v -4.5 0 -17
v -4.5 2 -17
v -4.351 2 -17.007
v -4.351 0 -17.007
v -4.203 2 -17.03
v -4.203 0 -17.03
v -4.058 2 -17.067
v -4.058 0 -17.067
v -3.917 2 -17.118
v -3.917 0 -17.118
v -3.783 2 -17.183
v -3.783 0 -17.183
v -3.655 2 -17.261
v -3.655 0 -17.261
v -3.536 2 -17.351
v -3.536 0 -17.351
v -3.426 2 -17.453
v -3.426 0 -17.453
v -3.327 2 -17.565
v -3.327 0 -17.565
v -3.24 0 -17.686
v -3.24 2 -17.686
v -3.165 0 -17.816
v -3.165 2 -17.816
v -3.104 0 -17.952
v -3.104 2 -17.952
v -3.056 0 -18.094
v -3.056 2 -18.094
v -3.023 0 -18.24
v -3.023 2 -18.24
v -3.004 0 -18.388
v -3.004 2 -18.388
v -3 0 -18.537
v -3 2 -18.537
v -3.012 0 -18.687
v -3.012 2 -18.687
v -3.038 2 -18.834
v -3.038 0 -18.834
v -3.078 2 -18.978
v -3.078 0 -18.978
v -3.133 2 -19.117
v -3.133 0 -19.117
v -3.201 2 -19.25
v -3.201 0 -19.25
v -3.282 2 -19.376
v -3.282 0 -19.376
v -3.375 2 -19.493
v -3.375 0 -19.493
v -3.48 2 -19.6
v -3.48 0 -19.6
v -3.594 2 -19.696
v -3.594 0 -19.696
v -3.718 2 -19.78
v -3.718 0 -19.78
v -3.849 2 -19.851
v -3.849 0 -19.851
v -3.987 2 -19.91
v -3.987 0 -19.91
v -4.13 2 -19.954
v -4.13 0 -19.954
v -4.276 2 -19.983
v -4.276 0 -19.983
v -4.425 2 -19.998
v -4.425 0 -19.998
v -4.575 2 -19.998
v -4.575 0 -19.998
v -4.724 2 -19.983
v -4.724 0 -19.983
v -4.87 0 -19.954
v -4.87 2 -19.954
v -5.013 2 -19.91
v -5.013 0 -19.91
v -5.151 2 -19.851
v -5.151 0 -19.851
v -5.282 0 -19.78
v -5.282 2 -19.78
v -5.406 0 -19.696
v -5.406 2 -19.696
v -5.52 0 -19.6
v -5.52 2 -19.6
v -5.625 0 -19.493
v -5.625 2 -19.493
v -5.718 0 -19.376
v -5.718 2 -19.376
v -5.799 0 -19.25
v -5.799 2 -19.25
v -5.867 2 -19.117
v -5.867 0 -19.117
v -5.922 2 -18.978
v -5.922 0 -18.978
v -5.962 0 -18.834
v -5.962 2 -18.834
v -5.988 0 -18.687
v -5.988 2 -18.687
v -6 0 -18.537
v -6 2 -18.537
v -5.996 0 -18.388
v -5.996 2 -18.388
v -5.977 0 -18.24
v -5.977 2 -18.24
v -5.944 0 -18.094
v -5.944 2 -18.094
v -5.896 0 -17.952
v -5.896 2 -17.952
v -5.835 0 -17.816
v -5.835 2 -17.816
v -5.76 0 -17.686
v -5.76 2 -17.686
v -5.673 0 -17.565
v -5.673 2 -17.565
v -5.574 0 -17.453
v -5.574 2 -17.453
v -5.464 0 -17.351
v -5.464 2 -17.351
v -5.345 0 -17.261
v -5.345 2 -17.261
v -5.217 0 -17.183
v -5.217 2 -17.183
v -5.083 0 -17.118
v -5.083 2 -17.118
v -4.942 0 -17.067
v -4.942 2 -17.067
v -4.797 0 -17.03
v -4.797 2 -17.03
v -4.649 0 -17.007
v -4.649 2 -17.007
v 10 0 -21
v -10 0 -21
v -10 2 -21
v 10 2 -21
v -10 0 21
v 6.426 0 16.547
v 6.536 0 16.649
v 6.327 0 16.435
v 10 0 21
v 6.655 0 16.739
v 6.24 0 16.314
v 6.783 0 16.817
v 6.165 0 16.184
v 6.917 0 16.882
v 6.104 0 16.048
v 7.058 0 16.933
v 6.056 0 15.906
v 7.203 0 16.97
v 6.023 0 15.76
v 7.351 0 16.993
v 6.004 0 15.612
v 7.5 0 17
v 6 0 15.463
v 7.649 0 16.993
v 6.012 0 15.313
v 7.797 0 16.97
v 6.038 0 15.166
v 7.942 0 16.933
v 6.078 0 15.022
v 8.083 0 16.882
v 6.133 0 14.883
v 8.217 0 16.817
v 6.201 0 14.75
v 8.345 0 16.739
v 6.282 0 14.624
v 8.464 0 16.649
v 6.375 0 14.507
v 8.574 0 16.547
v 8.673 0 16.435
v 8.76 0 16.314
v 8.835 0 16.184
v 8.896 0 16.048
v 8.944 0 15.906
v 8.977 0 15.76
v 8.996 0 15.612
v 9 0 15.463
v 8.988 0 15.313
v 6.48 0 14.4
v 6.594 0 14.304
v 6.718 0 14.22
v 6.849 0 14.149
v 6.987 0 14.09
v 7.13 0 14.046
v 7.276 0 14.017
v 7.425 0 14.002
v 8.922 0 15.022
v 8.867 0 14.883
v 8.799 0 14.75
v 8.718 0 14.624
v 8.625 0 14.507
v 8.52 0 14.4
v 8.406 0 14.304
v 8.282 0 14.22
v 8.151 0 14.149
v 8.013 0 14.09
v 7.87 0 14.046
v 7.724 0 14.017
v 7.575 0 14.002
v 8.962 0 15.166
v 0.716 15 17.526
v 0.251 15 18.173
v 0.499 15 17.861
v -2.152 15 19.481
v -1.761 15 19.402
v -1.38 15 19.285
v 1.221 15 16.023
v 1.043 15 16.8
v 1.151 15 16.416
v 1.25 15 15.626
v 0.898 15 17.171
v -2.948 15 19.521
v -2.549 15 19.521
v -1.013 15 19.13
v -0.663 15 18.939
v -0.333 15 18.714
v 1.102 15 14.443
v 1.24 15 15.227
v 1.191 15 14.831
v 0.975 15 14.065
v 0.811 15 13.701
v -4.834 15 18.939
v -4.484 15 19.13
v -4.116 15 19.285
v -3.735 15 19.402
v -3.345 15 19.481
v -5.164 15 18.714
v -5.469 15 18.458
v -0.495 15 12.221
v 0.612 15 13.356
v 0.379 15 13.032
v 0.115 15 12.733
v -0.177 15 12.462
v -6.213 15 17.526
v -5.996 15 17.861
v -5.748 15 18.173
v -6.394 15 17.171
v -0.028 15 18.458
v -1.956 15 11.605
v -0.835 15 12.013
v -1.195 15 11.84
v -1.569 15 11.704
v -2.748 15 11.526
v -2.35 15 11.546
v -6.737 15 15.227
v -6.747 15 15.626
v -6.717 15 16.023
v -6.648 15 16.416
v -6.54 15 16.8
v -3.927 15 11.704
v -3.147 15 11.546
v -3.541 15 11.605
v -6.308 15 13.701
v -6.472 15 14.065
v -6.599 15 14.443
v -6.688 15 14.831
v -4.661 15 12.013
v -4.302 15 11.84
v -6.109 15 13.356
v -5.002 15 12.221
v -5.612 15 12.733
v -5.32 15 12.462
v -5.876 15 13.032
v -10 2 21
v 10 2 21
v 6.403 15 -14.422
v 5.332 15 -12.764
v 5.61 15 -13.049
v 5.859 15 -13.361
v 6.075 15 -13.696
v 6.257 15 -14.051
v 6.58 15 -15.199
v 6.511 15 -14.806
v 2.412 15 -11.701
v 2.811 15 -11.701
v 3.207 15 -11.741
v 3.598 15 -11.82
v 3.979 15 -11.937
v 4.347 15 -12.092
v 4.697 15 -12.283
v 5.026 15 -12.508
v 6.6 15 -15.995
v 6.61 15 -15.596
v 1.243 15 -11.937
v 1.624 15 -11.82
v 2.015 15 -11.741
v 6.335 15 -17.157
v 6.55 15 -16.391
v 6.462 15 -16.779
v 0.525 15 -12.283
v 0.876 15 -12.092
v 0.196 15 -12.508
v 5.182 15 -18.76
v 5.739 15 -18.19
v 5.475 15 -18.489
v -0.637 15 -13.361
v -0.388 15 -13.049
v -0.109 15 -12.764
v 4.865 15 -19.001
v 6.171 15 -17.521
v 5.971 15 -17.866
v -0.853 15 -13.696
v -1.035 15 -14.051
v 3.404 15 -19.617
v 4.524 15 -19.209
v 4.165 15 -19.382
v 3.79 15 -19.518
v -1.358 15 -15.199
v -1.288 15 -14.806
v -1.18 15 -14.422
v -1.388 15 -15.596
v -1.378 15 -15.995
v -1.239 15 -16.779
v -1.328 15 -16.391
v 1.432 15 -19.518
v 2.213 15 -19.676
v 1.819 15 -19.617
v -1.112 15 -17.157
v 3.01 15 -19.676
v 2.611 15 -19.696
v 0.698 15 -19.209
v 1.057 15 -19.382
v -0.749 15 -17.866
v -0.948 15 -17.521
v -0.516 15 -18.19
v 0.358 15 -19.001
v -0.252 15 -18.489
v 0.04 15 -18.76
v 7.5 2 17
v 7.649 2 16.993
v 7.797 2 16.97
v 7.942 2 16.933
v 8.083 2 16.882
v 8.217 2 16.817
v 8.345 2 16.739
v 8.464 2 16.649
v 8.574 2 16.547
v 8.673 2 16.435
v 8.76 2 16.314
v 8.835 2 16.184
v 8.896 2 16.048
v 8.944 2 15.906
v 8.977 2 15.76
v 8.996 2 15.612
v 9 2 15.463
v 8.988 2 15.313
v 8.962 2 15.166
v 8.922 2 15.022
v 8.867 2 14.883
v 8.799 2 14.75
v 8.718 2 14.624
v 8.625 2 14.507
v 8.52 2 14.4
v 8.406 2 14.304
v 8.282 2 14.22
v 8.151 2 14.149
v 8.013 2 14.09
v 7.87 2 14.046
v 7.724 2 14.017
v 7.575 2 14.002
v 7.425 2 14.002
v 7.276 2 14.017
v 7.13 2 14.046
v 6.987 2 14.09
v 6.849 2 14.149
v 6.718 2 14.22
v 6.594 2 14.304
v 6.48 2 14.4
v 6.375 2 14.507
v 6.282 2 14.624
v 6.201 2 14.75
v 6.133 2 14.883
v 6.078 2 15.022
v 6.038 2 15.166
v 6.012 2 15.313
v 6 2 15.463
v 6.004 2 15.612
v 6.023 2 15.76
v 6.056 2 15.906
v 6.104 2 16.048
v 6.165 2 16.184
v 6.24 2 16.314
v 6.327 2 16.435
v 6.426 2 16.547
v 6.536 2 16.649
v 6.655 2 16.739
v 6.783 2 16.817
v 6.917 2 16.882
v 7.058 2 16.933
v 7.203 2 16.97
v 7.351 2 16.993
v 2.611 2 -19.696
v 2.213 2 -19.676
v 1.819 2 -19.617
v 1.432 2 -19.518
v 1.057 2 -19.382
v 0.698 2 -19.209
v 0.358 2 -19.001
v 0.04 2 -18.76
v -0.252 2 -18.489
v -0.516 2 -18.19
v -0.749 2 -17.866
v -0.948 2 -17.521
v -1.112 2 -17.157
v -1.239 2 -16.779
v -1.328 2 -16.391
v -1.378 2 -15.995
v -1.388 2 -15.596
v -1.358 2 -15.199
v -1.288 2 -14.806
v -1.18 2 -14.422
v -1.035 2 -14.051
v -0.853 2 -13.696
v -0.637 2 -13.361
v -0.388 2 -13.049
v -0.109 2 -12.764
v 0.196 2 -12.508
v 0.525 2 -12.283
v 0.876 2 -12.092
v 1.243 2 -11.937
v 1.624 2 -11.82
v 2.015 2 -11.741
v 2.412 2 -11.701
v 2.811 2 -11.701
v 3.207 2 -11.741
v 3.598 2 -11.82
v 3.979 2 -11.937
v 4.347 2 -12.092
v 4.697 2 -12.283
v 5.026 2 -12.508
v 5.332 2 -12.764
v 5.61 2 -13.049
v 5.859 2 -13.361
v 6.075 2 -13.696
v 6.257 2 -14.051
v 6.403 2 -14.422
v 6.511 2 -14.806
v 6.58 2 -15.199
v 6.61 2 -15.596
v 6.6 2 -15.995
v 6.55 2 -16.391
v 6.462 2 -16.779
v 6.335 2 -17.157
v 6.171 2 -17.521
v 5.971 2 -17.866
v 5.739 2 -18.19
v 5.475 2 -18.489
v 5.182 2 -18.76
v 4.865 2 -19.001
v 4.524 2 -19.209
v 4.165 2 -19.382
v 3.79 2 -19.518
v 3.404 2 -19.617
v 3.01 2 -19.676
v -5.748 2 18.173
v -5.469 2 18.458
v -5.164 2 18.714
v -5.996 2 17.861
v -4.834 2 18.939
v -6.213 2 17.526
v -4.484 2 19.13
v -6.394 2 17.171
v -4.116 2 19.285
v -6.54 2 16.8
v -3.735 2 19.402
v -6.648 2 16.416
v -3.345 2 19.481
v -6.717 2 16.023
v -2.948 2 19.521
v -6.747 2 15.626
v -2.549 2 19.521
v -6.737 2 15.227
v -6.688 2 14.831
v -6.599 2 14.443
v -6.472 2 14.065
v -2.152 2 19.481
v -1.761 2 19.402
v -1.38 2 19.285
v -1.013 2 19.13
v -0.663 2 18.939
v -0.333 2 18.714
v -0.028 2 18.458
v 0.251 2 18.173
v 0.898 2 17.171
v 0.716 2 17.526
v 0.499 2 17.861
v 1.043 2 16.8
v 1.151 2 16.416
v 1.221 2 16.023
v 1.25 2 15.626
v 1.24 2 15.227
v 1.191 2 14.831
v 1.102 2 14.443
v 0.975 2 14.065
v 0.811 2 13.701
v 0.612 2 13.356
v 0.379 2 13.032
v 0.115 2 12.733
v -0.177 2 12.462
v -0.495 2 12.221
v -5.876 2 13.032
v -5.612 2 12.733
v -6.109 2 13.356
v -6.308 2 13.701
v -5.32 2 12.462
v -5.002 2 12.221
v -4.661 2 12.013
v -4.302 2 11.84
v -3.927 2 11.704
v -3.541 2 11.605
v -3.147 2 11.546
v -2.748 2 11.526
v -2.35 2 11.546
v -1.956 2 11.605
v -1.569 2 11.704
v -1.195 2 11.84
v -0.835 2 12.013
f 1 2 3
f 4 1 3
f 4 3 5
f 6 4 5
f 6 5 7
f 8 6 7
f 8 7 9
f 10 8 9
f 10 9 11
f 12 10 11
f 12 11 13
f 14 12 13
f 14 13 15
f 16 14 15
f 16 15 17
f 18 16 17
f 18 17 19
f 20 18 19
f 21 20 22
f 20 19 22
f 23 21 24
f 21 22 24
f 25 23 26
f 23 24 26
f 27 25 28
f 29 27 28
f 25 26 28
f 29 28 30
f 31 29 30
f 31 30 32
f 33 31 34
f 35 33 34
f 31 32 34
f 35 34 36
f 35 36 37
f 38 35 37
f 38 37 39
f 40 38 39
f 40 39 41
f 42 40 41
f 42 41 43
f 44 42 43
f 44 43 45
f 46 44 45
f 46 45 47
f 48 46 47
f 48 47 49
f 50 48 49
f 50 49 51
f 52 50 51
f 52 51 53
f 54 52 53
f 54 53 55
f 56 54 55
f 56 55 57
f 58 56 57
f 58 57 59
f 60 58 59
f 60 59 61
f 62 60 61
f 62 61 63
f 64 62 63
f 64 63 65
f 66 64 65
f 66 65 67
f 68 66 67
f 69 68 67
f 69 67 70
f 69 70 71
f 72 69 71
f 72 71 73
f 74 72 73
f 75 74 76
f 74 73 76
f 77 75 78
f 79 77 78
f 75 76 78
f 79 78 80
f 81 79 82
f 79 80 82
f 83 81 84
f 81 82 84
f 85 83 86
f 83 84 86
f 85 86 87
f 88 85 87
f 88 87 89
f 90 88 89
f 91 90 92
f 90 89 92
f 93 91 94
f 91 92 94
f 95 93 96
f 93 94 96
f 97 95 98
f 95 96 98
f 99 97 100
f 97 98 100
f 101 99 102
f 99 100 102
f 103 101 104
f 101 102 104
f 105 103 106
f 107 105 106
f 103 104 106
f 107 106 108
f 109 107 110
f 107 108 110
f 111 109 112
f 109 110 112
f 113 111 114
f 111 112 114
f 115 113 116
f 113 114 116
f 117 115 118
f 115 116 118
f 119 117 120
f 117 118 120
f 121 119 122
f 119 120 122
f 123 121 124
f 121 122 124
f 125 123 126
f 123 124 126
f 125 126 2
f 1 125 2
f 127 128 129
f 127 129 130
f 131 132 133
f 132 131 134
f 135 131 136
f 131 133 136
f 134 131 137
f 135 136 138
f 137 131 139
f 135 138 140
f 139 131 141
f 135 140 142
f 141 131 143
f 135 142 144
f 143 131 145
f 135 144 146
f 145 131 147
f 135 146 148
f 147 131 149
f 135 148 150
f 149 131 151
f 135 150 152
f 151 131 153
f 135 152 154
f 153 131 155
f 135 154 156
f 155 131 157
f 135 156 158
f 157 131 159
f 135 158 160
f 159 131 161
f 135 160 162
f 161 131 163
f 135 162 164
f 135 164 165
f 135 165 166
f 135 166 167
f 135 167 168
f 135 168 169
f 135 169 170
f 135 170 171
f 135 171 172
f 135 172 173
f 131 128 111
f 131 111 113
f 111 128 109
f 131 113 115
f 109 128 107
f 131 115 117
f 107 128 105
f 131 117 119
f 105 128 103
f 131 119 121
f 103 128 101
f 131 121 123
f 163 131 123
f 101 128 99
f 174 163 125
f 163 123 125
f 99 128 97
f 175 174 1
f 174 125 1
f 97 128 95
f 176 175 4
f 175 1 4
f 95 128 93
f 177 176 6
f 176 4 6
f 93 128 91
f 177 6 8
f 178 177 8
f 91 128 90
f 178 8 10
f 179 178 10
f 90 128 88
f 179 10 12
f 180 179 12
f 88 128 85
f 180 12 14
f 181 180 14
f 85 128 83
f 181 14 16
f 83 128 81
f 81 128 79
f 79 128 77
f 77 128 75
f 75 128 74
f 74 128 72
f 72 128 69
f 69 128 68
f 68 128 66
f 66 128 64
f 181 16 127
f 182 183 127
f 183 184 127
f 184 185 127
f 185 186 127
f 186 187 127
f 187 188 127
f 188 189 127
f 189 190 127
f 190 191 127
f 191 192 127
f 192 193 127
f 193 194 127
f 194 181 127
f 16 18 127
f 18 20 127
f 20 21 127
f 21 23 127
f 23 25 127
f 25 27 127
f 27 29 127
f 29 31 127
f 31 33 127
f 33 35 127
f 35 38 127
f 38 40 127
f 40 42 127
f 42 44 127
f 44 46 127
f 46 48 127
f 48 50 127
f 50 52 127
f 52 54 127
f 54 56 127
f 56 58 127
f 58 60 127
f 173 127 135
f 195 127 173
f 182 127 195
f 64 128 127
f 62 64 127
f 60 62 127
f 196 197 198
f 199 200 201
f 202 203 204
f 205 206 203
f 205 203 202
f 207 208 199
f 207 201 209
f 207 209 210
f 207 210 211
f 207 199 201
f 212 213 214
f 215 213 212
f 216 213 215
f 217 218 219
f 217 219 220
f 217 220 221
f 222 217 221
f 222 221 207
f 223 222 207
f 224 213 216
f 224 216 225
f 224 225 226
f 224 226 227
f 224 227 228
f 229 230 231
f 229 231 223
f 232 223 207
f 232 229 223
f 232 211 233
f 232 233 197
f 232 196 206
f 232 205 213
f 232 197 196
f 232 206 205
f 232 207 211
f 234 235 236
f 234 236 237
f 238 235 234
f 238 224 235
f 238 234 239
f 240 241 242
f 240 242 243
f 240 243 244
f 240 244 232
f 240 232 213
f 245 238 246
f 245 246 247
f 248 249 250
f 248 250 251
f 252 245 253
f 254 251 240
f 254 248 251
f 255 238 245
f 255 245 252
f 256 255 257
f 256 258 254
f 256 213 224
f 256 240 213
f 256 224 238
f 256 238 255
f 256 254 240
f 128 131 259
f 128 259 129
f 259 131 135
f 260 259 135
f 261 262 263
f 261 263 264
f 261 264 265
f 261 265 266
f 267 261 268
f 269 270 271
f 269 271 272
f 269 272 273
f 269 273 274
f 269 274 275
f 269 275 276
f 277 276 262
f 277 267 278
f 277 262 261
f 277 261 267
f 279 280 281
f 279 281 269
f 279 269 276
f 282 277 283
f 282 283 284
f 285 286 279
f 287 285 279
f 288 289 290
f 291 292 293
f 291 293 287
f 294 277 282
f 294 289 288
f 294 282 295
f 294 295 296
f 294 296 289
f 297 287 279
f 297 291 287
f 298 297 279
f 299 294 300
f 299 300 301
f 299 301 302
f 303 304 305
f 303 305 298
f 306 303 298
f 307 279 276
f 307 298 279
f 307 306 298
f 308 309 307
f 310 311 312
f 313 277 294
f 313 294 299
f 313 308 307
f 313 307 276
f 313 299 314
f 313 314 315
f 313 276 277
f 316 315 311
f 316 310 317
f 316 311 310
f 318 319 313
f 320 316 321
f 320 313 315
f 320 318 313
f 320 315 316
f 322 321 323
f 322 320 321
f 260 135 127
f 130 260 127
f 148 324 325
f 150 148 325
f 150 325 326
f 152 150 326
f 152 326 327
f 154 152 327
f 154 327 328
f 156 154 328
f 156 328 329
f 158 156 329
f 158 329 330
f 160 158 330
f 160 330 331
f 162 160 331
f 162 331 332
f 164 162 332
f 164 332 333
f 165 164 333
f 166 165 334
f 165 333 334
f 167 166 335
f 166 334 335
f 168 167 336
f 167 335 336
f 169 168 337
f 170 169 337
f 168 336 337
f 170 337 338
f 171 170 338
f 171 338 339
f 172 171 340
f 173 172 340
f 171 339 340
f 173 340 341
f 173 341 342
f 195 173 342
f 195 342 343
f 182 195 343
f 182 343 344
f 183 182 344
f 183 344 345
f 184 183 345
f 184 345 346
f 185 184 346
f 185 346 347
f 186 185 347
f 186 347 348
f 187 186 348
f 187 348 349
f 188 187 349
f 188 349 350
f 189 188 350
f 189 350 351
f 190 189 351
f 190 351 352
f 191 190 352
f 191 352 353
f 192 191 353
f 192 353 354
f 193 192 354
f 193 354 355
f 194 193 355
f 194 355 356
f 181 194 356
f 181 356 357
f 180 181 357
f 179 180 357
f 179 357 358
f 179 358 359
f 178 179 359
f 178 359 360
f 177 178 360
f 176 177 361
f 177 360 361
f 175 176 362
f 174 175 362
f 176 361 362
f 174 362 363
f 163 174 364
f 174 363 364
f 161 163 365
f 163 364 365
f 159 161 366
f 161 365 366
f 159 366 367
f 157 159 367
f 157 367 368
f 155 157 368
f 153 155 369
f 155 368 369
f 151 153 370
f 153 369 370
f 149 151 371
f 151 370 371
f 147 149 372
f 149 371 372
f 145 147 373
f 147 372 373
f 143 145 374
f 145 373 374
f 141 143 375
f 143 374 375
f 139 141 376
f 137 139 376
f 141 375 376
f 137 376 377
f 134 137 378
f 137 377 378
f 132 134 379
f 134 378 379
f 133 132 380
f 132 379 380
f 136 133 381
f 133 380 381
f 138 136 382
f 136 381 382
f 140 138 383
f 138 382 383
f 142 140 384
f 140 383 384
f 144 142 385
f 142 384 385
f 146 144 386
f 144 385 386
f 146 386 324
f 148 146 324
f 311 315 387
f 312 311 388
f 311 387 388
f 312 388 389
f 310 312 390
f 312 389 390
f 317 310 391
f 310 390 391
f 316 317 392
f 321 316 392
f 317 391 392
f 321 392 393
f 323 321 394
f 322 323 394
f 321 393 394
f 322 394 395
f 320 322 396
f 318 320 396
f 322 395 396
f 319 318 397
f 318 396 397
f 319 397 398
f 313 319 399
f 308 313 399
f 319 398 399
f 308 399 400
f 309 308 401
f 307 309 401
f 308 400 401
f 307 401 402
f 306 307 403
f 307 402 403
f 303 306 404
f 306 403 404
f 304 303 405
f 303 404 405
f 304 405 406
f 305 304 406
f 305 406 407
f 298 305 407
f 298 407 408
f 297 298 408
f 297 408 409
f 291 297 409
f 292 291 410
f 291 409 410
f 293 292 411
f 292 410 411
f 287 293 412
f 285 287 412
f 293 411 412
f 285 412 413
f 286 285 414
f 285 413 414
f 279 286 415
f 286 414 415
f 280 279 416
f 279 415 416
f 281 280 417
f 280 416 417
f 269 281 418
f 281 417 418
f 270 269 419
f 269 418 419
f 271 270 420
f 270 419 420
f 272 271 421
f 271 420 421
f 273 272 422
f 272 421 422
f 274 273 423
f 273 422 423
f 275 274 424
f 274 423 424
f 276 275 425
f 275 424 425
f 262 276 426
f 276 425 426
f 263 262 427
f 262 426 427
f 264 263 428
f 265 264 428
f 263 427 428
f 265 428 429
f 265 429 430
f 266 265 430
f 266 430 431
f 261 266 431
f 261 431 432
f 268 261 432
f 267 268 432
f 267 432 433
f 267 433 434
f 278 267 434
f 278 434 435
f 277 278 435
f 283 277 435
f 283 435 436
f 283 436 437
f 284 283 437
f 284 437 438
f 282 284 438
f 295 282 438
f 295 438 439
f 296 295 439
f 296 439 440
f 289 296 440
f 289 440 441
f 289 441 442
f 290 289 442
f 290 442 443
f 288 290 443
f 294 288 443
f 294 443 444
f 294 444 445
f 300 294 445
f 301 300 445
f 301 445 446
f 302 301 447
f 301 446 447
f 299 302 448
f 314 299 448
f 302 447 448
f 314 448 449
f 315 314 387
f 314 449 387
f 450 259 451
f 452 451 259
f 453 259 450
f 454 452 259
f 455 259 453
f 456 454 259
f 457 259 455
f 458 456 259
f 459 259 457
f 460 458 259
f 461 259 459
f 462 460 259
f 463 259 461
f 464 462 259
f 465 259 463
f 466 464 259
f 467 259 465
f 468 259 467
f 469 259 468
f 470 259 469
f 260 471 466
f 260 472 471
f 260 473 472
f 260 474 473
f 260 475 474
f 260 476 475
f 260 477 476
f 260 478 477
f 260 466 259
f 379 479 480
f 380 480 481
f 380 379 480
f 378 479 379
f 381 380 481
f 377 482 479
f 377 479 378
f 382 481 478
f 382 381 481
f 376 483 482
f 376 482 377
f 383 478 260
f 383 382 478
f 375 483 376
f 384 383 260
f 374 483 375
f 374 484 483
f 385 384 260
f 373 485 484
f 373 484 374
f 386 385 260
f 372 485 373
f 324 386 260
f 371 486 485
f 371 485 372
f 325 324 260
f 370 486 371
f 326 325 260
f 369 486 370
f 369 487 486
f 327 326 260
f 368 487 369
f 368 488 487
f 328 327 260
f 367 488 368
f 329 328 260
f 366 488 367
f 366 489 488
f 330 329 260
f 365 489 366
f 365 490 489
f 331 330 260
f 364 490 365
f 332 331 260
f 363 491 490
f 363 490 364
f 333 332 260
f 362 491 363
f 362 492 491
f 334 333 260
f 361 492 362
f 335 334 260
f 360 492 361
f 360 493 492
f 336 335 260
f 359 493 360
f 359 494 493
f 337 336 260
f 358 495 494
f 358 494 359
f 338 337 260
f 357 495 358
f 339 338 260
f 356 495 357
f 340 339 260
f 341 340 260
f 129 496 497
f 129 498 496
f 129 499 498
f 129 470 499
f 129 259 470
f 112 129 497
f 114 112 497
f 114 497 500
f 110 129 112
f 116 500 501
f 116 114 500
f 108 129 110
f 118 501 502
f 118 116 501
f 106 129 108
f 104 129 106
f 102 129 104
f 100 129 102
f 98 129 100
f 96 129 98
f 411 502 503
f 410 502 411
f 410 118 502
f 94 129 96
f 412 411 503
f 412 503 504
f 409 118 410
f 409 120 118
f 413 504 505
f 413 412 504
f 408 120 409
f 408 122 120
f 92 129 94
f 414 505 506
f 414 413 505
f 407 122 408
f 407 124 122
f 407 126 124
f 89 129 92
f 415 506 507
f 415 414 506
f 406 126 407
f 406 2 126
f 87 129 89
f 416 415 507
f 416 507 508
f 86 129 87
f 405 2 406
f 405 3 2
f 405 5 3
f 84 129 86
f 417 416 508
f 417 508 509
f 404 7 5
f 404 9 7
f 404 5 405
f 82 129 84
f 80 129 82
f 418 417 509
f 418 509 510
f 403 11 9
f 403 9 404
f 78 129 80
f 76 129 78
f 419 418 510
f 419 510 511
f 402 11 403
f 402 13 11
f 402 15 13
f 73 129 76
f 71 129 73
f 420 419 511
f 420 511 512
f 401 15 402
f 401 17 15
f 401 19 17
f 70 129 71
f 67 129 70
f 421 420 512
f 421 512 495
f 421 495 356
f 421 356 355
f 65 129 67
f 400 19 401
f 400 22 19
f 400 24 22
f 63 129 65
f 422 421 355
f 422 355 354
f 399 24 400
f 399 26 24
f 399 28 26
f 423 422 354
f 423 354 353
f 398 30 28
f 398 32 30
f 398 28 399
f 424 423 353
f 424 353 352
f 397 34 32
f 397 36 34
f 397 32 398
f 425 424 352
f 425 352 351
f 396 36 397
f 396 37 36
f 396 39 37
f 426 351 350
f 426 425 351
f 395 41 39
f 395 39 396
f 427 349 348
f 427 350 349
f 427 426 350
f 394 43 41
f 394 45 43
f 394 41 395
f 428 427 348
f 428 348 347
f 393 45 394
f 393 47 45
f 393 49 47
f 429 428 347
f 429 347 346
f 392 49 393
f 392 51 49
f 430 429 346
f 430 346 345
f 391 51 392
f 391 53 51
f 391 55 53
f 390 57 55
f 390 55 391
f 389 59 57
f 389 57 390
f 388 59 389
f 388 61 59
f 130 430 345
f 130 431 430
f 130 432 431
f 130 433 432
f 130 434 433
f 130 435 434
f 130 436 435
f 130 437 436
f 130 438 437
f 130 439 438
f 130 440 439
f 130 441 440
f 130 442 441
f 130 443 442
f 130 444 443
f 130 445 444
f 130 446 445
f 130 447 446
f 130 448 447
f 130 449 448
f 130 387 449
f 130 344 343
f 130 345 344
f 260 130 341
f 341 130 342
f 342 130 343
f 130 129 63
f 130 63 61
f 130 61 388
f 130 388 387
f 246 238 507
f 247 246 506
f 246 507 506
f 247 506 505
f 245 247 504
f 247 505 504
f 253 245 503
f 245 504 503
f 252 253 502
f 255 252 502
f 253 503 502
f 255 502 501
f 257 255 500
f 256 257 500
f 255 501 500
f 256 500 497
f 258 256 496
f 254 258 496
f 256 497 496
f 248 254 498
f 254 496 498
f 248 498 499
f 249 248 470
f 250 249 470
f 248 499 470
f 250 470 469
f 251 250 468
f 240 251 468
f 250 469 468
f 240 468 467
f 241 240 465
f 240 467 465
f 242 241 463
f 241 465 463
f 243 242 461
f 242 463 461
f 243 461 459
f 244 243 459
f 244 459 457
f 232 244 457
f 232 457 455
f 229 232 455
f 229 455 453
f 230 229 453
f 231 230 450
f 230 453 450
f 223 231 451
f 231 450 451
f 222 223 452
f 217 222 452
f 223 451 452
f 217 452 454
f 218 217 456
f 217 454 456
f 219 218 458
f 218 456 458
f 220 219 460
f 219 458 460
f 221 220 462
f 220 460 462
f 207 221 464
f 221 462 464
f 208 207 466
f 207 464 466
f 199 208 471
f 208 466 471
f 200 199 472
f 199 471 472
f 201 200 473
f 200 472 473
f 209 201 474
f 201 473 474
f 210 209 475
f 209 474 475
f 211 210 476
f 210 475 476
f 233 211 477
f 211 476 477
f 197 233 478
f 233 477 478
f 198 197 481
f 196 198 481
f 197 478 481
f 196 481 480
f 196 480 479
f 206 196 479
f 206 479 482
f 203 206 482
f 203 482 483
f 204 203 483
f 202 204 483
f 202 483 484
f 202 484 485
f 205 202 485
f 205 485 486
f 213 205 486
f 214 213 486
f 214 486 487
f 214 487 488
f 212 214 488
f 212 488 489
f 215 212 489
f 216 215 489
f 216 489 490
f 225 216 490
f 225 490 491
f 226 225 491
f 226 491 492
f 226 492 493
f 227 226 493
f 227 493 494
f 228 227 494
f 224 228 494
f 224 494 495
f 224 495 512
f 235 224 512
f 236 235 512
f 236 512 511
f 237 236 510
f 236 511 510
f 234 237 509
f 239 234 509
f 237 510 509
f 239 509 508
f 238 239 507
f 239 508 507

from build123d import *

# Parameters (mm, degrees)
SKETCH1_W           = 20
SKETCH1_H           = 42
BOSS_EXTRUDE1_DEPTH = 2
SKETCH2_R           = 4
BOSS_EXTRUDE2_DEPTH = 13
SKETCH3_R           = 1.5
CUT_EXTRUDE1_DEPTH  = 27.645825189


with BuildPart() as part:
    # Sketch1 → Boss-Extrude1 (new body)
    with BuildSketch(Plane(origin=(0, 0, 0), x_dir=(1, 0, 0), z_dir=(0, 1, 0))):
        Rectangle(SKETCH1_W, SKETCH1_H)
    extrude(amount=BOSS_EXTRUDE1_DEPTH)

    # Sketch2 → Boss-Extrude2 (add)
    with BuildSketch(Plane(origin=(0, 2, 0), x_dir=(1, 0, 0), z_dir=(0, 1, 0))):
        with Locations(Location((2.611238323, 15.696088344, 0), (0, 0, 90))):
            Circle(SKETCH2_R)
        with Locations(Location((-2.7484016, -15.525941045, 0), (0, 0, 90))):
            Circle(SKETCH2_R)
    extrude(amount=BOSS_EXTRUDE2_DEPTH)

    # Sketch3 → Cut-Extrude1 (cut, through all)
    with BuildSketch(Plane(origin=(0, 2, 0), x_dir=(1, 0, 0), z_dir=(0, 1, 0))):
        with Locations(Location((-4.5, 18.5, 0), (0, 0, 270))):
            Circle(SKETCH3_R)
        with Locations(Location((7.5, -15.5, 0), (0, 0, 270))):
            Circle(SKETCH3_R)
    extrude(amount=-CUT_EXTRUDE1_DEPTH, mode=Mode.SUBTRACT)


solid = part.part
